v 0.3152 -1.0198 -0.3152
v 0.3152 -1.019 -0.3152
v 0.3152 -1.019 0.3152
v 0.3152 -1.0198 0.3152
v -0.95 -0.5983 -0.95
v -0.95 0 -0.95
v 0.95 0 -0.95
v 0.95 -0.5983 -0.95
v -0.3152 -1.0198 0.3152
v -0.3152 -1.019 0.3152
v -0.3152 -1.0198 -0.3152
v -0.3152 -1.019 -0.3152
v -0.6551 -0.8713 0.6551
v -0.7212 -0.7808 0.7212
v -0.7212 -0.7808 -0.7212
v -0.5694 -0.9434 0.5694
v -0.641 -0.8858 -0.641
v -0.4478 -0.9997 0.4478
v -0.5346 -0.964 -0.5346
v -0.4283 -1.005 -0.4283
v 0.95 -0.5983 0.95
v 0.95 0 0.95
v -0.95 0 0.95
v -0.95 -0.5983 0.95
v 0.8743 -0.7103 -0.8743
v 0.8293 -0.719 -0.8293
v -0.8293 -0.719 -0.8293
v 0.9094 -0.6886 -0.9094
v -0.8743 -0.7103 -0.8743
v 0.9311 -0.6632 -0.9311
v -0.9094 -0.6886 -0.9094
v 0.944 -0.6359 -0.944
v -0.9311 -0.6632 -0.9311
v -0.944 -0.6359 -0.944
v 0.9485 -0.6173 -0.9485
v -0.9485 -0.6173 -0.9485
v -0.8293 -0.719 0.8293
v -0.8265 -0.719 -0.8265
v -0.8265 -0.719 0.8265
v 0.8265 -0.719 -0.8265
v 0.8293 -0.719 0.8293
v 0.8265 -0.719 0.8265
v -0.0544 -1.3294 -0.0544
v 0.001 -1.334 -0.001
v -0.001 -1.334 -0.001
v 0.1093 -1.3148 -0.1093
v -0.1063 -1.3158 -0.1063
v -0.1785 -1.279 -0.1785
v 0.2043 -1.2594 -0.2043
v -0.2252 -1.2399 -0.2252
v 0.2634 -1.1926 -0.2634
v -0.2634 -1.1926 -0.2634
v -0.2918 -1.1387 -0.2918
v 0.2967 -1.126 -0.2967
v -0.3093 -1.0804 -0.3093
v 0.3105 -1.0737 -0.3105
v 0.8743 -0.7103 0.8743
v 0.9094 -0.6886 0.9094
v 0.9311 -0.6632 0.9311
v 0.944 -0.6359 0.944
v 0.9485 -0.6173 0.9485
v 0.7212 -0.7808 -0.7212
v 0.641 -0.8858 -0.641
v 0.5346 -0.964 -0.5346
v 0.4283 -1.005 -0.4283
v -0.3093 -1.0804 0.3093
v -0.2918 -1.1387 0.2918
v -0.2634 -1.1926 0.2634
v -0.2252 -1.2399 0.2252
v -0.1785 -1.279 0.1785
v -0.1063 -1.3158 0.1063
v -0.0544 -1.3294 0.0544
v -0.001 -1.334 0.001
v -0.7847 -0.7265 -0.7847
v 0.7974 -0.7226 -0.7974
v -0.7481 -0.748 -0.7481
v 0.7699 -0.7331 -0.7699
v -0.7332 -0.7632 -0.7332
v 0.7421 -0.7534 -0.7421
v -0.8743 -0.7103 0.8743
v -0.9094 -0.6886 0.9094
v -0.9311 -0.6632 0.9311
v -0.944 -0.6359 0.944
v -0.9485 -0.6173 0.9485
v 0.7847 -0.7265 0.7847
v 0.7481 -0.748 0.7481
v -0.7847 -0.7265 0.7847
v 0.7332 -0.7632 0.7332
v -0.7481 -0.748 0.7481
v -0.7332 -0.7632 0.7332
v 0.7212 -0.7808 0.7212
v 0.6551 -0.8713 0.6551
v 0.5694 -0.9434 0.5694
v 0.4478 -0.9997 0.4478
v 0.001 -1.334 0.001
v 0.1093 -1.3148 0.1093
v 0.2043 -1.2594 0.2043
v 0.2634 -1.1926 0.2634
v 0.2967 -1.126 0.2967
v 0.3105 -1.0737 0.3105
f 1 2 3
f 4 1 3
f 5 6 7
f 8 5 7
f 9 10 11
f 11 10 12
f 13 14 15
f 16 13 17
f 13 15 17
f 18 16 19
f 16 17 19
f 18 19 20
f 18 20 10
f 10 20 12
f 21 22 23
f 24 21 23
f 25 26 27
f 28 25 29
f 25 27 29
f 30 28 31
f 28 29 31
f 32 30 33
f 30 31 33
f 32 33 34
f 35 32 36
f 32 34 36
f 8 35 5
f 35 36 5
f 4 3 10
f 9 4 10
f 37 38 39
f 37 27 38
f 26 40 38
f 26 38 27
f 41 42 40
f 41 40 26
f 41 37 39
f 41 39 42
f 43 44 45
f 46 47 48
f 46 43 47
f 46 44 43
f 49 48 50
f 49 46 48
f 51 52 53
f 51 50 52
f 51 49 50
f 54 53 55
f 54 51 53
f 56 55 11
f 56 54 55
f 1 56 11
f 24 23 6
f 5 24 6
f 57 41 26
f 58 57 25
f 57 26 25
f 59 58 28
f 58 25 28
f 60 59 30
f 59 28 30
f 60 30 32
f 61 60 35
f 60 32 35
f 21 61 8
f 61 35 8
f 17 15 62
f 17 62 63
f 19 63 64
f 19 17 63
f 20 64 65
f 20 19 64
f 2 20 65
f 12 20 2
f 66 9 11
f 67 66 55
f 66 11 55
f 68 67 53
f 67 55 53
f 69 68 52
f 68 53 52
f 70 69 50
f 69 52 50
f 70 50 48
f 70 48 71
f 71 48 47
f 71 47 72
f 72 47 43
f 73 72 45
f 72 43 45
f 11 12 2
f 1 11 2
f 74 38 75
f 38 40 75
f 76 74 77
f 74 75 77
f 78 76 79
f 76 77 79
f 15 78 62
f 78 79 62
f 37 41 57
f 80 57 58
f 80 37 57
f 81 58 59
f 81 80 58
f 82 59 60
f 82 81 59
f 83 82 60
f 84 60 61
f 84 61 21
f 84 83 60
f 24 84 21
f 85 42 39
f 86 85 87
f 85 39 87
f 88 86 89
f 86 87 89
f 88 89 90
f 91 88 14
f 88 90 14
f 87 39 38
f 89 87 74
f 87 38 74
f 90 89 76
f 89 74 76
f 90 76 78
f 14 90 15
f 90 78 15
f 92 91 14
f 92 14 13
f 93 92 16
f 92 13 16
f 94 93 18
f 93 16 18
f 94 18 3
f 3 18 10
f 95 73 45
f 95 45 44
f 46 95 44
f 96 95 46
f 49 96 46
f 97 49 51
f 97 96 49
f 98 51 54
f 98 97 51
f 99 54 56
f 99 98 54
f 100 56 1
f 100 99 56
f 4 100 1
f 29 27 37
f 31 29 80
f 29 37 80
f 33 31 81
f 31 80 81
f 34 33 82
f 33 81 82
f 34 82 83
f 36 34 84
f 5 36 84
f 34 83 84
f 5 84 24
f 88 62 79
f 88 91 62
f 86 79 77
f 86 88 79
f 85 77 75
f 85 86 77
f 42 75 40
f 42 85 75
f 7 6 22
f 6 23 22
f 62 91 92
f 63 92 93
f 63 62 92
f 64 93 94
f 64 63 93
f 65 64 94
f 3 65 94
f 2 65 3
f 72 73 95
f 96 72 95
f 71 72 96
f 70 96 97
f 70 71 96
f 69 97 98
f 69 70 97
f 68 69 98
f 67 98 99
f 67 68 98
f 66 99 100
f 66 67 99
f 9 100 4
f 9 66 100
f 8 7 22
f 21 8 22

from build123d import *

# Parameters (mm, degrees)
F0_W        = 0.95
F0_H        = 0.95
F1_DEPTH    = 0.719
F2_W        = 0.75
F2_H        = 0.75
F3_DEPTH    = 0.3
F4_T1_DEPTH = 3.6740515173
F4_T3_DEPTH = 3.6740515173
F5_W        = 0.3151896965
F5_H        = 0.3151896965
F6_DEPTH    = 0.315
F7_R        = 0.314196
F8_R        = 0.1207106781


# Not quite as in the source:
# - a fillet or chamfer that OpenCascade refuses, or shapes differently, is made with other operations: its cross-section is extruded or revolved along the edge and cut away or added
# - a fillet or chamfer is up to 0.001 mm smaller than in the source, because OpenCascade refuses the exact size


with BuildPart() as f1:
    # F0 (on Front) → F1 (new body)
    with BuildSketch(Plane.XZ):
        Polygon((0, 0.95), (0, 0), (-0.95, 0), (-0.95, -0.95), (0, -0.95), (0.95, -0.95), (0.95, 0), (0.95, 0.95), align=None)
        with Locations((-0.475, 0.475)):
            Rectangle(F0_W, F0_H)
    extrude(amount=F1_DEPTH)

    # F2 (on face) → F3 (join)
    with BuildSketch(Plane.XZ.offset(0.719)):
        Polygon((0, 0.75), (0, 0), (-0.75, 0), (-0.75, -0.75), (0, -0.75), (0.75, -0.75), (0.75, 0), (0.75, 0.75), align=None)
        with Locations((-0.375, 0.375)):
            Rectangle(F2_W, F2_H)
    extrude(amount=F3_DEPTH)

    # F4: fillet of radius 0.4651 on 4 edges, made by hand

    # F4_s2 → F4_t1 (cut)
    with BuildSketch(Plane.YZ.offset(-1.8370257587)):
        with BuildLine():
            ThreePointArc((-0.719, -0.75), (-0.9367224262, -0.579320346), (-1.019, -0.3151896965))
            Line((-1.019, -0.3151896965), (-1.019, -0.75))
            Line((-1.019, -0.75), (-0.719, -0.75))
        make_face()
        with BuildLine():
            ThreePointArc((-0.719, 0.75), (-0.9367224262, 0.579320346), (-1.019, 0.3151896965))
            Line((-1.019, 0.3151896965), (-1.019, 0.75))
            Line((-1.019, 0.75), (-0.719, 0.75))
        make_face()
    extrude(amount=F4_T1_DEPTH, mode=Mode.SUBTRACT)

    # F4_s4 → F4_t3 (cut)
    with BuildSketch(Plane.XY.offset(-1.8370257587)):
        with BuildLine():
            ThreePointArc((0.75, -0.719), (0.579320346, -0.9367224262), (0.3151896965, -1.019))
            Line((0.3151896965, -1.019), (0.75, -1.019))
            Line((0.75, -1.019), (0.75, -0.719))
        make_face()
        with BuildLine():
            ThreePointArc((-0.75, -0.719), (-0.579320346, -0.9367224262), (-0.3151896965, -1.019))
            Line((-0.3151896965, -1.019), (-0.75, -1.019))
            Line((-0.75, -1.019), (-0.75, -0.719))
        make_face()
    extrude(amount=F4_T3_DEPTH, mode=Mode.SUBTRACT)

    # F5 (on face) → F6 (join)
    with BuildSketch(Plane.XZ.offset(1.019)):
        with Locations((-0.1575948483, 0.1575948483)):
            Rectangle(F5_W, F5_H)
        Polygon((0.3151896965, 0.3151896965), (0, 0.3151896965), (0, 0), (-0.3151896965, 0), (-0.3151896965, -0.3151896965), (0, -0.3151896965), (0.3151896965, -0.3151896965), (0.3151896965, 0), align=None)
    extrude(amount=F6_DEPTH)

    # F7 (radius 0.315196 in the source; OpenCascade refuses exactly that, so slightly less here)
    f7_edges = [f1.edges().sort_by_distance(p)[0] for p in [
        (-0.31519, -1.334, 0),
        (0, -1.334, -0.31519),
        (0.31519, -1.334, 0),
        (0, -1.334, 0.31519),
    ]]
    fillet(f7_edges, radius=F7_R)

    # F8
    f8_edges = [f1.edges().sort_by_distance(p)[0] for p in [
        (-0.95, -0.719, 0),
        (0, -0.719, -0.95),
        (0.95, -0.719, 0),
        (0, -0.719, 0.95),
        (-0.75, -0.719, 0),
        (0, -0.719, 0.75),
        (0.75, -0.719, 0),
        (0, -0.719, -0.75),
    ]]
    fillet(f8_edges, radius=F8_R)


solid = f1.part
